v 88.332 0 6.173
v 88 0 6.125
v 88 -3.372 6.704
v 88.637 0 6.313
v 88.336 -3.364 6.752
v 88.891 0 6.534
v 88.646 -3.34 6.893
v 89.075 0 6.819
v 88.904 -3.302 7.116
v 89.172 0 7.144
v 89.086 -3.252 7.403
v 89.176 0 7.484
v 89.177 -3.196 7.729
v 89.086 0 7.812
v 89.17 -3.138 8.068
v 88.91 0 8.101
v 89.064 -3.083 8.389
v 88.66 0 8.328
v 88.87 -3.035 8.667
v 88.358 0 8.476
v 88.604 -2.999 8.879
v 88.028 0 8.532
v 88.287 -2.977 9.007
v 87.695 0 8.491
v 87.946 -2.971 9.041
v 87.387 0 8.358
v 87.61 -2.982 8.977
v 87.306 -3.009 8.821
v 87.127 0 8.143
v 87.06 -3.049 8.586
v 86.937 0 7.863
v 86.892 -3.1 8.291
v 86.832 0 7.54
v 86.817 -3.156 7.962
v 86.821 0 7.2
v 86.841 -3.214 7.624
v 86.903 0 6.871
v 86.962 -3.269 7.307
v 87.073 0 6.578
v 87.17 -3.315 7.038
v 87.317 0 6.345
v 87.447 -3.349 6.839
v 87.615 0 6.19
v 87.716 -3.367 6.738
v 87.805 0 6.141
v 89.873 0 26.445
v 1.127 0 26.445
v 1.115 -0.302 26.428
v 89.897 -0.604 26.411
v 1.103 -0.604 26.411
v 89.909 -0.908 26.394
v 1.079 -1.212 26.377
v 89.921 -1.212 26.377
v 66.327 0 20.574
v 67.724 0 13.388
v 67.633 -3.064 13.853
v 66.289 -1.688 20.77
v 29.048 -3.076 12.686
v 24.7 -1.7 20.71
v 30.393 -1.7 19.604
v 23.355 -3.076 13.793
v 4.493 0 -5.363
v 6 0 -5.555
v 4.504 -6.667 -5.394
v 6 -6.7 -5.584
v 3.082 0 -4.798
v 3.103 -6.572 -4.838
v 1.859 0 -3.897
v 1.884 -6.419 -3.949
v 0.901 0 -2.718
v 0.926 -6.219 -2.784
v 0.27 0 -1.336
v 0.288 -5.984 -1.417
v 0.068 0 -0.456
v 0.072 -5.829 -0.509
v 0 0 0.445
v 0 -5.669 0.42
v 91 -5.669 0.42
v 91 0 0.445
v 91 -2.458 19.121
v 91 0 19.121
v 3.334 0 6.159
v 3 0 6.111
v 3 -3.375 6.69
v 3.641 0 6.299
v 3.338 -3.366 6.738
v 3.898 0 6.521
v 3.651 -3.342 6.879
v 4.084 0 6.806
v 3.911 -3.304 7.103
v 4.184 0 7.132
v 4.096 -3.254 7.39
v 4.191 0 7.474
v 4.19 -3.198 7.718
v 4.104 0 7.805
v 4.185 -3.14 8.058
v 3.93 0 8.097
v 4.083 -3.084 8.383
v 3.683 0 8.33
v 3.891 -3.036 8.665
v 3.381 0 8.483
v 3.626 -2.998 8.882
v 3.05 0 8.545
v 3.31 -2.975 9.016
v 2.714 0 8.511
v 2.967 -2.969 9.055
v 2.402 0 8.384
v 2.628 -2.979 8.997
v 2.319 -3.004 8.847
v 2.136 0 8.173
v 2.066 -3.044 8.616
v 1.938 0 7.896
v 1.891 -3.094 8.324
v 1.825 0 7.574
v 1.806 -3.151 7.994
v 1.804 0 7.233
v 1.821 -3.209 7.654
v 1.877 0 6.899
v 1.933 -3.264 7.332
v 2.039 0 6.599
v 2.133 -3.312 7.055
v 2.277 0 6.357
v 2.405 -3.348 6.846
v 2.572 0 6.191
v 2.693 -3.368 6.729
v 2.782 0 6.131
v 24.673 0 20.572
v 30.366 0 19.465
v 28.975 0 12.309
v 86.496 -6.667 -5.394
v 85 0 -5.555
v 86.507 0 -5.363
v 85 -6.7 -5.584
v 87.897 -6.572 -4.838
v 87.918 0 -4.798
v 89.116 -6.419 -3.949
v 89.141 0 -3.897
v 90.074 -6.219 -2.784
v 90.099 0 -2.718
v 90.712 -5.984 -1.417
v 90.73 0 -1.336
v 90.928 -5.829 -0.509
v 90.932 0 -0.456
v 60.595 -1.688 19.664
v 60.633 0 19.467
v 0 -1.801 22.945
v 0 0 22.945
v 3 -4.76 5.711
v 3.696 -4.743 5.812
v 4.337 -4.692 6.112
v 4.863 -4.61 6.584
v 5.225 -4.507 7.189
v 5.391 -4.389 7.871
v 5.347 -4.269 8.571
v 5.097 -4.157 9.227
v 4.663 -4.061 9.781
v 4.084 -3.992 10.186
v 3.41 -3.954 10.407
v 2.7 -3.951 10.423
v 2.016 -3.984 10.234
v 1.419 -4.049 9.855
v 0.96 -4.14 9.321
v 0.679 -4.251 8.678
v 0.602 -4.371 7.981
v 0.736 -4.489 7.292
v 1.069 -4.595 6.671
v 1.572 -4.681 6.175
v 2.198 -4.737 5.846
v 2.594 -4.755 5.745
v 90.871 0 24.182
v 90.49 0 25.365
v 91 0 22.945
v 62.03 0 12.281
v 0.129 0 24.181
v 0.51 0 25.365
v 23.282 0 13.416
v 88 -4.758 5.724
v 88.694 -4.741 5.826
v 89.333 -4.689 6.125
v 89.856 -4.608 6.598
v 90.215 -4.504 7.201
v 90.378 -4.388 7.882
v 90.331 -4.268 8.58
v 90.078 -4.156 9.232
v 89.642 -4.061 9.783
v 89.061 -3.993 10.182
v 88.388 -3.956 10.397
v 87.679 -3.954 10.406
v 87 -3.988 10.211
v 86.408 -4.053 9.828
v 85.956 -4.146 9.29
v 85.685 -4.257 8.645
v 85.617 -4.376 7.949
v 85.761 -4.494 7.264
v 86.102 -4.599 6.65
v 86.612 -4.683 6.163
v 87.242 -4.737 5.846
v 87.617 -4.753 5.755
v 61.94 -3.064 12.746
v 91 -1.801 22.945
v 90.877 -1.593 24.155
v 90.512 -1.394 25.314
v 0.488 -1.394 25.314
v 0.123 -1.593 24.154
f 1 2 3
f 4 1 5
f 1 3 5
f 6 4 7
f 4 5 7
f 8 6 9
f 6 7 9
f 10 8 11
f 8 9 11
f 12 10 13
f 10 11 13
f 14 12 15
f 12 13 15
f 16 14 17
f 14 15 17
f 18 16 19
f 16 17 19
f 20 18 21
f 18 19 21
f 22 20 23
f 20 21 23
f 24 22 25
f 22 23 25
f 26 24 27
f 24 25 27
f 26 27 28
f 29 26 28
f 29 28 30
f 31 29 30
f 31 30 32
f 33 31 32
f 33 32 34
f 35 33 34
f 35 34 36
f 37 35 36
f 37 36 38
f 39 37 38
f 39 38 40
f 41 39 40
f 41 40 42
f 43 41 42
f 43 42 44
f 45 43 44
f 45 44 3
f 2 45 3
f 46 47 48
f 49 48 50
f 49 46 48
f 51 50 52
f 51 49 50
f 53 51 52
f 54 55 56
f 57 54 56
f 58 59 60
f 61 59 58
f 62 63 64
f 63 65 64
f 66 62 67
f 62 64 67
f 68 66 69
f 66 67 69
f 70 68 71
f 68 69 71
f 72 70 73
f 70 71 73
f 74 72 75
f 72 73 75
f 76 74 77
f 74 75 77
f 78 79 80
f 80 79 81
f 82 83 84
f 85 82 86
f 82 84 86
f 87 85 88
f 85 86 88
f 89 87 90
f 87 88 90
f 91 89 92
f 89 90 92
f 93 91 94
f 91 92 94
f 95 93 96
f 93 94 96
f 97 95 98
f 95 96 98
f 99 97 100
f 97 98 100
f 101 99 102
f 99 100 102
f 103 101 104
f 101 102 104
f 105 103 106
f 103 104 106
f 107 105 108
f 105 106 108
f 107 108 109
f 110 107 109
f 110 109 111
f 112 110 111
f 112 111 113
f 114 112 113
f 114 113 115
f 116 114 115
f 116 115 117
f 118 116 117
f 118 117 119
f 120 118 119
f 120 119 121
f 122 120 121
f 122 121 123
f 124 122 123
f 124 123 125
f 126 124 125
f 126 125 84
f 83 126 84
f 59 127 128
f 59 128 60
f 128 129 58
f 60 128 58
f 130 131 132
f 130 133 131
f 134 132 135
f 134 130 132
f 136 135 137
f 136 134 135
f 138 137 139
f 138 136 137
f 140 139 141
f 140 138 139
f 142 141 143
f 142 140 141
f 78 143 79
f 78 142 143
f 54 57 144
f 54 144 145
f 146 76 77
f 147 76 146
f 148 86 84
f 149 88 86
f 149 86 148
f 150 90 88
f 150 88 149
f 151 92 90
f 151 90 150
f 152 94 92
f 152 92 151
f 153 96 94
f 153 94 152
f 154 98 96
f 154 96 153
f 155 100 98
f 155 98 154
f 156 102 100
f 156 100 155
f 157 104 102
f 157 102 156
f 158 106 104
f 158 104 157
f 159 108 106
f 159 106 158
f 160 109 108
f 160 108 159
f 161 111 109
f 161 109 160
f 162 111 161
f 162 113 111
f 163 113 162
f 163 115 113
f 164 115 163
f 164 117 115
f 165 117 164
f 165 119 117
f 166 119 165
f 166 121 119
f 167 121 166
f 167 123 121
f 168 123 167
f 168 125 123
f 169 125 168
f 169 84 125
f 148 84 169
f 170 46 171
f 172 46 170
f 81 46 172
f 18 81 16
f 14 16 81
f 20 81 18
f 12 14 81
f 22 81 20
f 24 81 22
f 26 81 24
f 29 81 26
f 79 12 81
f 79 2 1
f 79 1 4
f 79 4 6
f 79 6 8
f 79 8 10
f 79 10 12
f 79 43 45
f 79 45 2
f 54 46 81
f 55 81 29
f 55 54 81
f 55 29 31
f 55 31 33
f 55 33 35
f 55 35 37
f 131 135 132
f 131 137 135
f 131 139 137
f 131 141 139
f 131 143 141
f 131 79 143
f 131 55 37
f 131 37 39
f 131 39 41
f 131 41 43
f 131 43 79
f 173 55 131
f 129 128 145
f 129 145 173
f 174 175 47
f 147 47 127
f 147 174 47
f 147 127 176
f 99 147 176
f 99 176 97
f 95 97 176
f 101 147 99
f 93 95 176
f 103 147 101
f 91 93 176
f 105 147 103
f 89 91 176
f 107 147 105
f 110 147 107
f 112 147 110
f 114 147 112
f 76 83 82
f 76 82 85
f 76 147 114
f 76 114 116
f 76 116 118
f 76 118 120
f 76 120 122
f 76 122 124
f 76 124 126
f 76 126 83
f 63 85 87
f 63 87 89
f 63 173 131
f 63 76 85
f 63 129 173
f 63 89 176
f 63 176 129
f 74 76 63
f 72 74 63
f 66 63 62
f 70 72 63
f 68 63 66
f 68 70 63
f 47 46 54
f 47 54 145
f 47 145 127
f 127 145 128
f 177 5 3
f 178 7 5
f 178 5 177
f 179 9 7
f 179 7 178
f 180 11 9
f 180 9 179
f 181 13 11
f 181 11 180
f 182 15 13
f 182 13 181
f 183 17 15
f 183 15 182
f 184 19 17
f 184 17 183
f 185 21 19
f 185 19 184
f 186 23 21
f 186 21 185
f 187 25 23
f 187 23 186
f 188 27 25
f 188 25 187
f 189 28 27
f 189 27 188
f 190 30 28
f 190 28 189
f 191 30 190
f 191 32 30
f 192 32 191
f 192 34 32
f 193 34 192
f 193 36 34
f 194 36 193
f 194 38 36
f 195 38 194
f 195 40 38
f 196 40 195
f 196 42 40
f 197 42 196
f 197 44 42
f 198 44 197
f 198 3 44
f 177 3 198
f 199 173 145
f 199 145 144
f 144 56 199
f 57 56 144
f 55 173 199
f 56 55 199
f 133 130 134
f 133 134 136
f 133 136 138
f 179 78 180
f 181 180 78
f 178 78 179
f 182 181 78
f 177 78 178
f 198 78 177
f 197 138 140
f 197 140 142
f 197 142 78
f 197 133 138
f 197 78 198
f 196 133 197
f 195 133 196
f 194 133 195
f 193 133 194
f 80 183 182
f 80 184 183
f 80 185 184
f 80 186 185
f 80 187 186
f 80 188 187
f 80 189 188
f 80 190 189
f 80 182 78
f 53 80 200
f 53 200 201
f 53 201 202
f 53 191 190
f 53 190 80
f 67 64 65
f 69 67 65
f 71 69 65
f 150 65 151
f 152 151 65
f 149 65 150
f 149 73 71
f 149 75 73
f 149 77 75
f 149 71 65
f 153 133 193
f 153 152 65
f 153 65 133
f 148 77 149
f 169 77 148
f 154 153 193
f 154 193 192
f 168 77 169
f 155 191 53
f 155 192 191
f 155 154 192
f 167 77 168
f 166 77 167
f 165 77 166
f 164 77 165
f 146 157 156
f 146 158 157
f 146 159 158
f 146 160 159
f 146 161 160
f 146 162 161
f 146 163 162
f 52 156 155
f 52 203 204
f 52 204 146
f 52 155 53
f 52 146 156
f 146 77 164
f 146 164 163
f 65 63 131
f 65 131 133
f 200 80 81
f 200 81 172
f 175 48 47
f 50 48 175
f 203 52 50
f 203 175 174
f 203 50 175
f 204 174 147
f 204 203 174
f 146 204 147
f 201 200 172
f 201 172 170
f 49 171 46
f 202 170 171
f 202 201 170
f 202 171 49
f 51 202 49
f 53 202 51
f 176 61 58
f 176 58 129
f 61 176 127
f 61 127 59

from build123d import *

# Parameters (mm, degrees)
EXTRUDE_2_DEPTH          = 91
FILLET_2_R               = 6
CUT_EXTRUDE_3_DEPTH      = 2.9
CUT_EXTRUDE_3_DEPTH_BACK = 2.9
CUT_EXTRUDE_4_DEPTH      = 2.9
CUT_EXTRUDE_4_DEPTH_BACK = 2.9
CUT_EXTRUDE_5_REACH      = 96.666
SKETCH_17_R              = 1.186185632
SKETCH_17_R_2            = 1.2
CHAMFER_1_SIZE           = 1.2
CUT_EXTRUDE_6_DEPTH      = 91
CUT_EXTRUDE_7_DEPTH      = 96.001094263
CUT_EXTRUDE_7_DEPTH_BACK = 96.001094263


with BuildPart() as part:
    # Эскиз2 → Бобышка-Вытянуть2 (new body)
    with BuildSketch(Plane(origin=(0, 0, 0), x_dir=(0, 0, -1), z_dir=(1, 0, 0))):
        Polygon((-26.444619702, 0), (5.555380298, 0), (5.584037691, -6.7), (-26.444619702, -1.2), align=None)
    extrude(amount=EXTRUDE_2_DEPTH)

    # Скругление2
    fillet_2_edges = [part.edges().sort_by_distance(p)[0] for p in [
        (91, -3.35, -5.569708994),
        (0, -3.35, -5.569708994),
    ]]
    fillet(fillet_2_edges, radius=FILLET_2_R)

    # Эскиз7 → Вырез-Вытянуть3 (cut, two sides: drawn at the far end of the back side and taken through both)
    with BuildSketch(Plane(origin=(22.76798721, 0, -4.425648392), x_dir=(0, -1, 0), z_dir=(0.9816271834476652, 0, -0.19080899537653845)).offset(-CUT_EXTRUDE_3_DEPTH_BACK)):
        Polygon((0, -17.611696981), (0, -24.901696981), (1.7, -25.042701632), (3.07611105, -17.995807395), align=None)
    extrude(amount=CUT_EXTRUDE_3_DEPTH + CUT_EXTRUDE_3_DEPTH_BACK, mode=Mode.SUBTRACT)

    # Эскиз16 → Вырез-Вытянуть4 (cut, two sides: drawn at the far end of the back side and taken through both)
    with BuildSketch(Plane(origin=(64.918878173, 0, 12.618951608), x_dir=(0, -1, 0), z_dir=(-0.9816271834476652, 0, -0.19080899537653845)).offset(-CUT_EXTRUDE_4_DEPTH_BACK)):
        Polygon((0, 0.219393943), (3.063590709, 0.693115345), (1.688216377, 7.740153407), (0, 7.540339831), align=None)
    extrude(amount=CUT_EXTRUDE_4_DEPTH + CUT_EXTRUDE_4_DEPTH_BACK, mode=Mode.SUBTRACT)

    # Вырез-Вытянуть5: up to this plane
    cut_extrude_5_end = Plane(origin=(91, 0, 26.444619702), z_dir=(0, -1, 0))
    # Эскиз17 → Вырез-Вытянуть5 (cut, up to the surface)
    with BuildSketch(Plane(origin=(0, -5.576656818, 0.957630291), x_dir=(1, 0, 0), z_dir=(0, -0.9855741825905647, 0.16924399726708236)), mode=Mode.PRIVATE) as cut_extrude_5_sk1:
        with Locations(Location((88, 7.222581836, 0), (0, 0, 270))):
            Circle(SKETCH_17_R)
    cut_extrude_5_tool1 = split(extrude(cut_extrude_5_sk1.sketch, amount=-CUT_EXTRUDE_5_REACH, mode=Mode.PRIVATE), bisect_by=cut_extrude_5_end, keep=Keep.BOTH, mode=Mode.PRIVATE)
    add(cut_extrude_5_tool1.solids().sort_by_distance((88, -4.354278, 8.07602))[0], mode=Mode.SUBTRACT)
    # Эскиз17 → Вырез-Вытянуть5 (cut, up to the surface)
    with BuildSketch(Plane(origin=(0, -5.576656818, 0.957630291), x_dir=(1, 0, 0), z_dir=(0, -0.9855741825905647, 0.16924399726708236)), mode=Mode.PRIVATE) as cut_extrude_5_sk2:
        with Locations(Location((3, 7.222581836, 0), (0, 0, 270))):
            Circle(SKETCH_17_R_2)
    cut_extrude_5_tool2 = split(extrude(cut_extrude_5_sk2.sketch, amount=-CUT_EXTRUDE_5_REACH, mode=Mode.PRIVATE), bisect_by=cut_extrude_5_end, keep=Keep.BOTH, mode=Mode.PRIVATE)
    add(cut_extrude_5_tool2.solids().sort_by_distance((3, -4.354278, 8.07602))[0], mode=Mode.SUBTRACT)

    # Фаска1
    chamfer_1_edges = [part.edges().sort_by_distance(p)[0] for p in [
        (88, -4.1535234, 9.245094415),
        (3, -4.151185401, 9.258709499),
    ]]
    chamfer(chamfer_1_edges, length=CHAMFER_1_SIZE)

    # Эскиз21 → Вырез-Вытянуть6 (cut)
    with BuildSketch(Plane(origin=(91, 0, 0), x_dir=(0, 0, -1), z_dir=(1, 0, 0))):
        Polygon((-26.444619702, 0), (-26.377093105, -1.211595749), (-26.444619702, -1.2), align=None)
    extrude(amount=-CUT_EXTRUDE_6_DEPTH, mode=Mode.SUBTRACT)

    # Эскиз22 → Вырез-Вытянуть7 (cut, two sides: drawn at the far end of the back side and taken through both)
    with BuildSketch(Plane(origin=(0, 0, 0), x_dir=(1, 0, 0), z_dir=(0, 1, 0)).offset(-CUT_EXTRUDE_7_DEPTH_BACK)):
        with BuildLine():
            ThreePointArc((1.126602828, -26.444619702), (0.288591109, -24.783045247), (0, -22.944619702))
            Line((0, -22.944619702), (0, -26.444619702))
            Line((0, -26.444619702), (1.126602828, -26.444619702))
        make_face()
        with BuildLine():
            ThreePointArc((90.999774909, -22.944972896), (90.711129698, -24.783213348), (89.873172092, -26.444619702))
            Line((89.873172092, -26.444619702), (91, -26.444619702))
            Line((91, -26.444619702), (91, -19.121160447))
            Line((91, -19.121160447), (90.999774909, -22.944972896))
        make_face()
    extrude(amount=CUT_EXTRUDE_7_DEPTH + CUT_EXTRUDE_7_DEPTH_BACK, mode=Mode.SUBTRACT)


solid = part.part
